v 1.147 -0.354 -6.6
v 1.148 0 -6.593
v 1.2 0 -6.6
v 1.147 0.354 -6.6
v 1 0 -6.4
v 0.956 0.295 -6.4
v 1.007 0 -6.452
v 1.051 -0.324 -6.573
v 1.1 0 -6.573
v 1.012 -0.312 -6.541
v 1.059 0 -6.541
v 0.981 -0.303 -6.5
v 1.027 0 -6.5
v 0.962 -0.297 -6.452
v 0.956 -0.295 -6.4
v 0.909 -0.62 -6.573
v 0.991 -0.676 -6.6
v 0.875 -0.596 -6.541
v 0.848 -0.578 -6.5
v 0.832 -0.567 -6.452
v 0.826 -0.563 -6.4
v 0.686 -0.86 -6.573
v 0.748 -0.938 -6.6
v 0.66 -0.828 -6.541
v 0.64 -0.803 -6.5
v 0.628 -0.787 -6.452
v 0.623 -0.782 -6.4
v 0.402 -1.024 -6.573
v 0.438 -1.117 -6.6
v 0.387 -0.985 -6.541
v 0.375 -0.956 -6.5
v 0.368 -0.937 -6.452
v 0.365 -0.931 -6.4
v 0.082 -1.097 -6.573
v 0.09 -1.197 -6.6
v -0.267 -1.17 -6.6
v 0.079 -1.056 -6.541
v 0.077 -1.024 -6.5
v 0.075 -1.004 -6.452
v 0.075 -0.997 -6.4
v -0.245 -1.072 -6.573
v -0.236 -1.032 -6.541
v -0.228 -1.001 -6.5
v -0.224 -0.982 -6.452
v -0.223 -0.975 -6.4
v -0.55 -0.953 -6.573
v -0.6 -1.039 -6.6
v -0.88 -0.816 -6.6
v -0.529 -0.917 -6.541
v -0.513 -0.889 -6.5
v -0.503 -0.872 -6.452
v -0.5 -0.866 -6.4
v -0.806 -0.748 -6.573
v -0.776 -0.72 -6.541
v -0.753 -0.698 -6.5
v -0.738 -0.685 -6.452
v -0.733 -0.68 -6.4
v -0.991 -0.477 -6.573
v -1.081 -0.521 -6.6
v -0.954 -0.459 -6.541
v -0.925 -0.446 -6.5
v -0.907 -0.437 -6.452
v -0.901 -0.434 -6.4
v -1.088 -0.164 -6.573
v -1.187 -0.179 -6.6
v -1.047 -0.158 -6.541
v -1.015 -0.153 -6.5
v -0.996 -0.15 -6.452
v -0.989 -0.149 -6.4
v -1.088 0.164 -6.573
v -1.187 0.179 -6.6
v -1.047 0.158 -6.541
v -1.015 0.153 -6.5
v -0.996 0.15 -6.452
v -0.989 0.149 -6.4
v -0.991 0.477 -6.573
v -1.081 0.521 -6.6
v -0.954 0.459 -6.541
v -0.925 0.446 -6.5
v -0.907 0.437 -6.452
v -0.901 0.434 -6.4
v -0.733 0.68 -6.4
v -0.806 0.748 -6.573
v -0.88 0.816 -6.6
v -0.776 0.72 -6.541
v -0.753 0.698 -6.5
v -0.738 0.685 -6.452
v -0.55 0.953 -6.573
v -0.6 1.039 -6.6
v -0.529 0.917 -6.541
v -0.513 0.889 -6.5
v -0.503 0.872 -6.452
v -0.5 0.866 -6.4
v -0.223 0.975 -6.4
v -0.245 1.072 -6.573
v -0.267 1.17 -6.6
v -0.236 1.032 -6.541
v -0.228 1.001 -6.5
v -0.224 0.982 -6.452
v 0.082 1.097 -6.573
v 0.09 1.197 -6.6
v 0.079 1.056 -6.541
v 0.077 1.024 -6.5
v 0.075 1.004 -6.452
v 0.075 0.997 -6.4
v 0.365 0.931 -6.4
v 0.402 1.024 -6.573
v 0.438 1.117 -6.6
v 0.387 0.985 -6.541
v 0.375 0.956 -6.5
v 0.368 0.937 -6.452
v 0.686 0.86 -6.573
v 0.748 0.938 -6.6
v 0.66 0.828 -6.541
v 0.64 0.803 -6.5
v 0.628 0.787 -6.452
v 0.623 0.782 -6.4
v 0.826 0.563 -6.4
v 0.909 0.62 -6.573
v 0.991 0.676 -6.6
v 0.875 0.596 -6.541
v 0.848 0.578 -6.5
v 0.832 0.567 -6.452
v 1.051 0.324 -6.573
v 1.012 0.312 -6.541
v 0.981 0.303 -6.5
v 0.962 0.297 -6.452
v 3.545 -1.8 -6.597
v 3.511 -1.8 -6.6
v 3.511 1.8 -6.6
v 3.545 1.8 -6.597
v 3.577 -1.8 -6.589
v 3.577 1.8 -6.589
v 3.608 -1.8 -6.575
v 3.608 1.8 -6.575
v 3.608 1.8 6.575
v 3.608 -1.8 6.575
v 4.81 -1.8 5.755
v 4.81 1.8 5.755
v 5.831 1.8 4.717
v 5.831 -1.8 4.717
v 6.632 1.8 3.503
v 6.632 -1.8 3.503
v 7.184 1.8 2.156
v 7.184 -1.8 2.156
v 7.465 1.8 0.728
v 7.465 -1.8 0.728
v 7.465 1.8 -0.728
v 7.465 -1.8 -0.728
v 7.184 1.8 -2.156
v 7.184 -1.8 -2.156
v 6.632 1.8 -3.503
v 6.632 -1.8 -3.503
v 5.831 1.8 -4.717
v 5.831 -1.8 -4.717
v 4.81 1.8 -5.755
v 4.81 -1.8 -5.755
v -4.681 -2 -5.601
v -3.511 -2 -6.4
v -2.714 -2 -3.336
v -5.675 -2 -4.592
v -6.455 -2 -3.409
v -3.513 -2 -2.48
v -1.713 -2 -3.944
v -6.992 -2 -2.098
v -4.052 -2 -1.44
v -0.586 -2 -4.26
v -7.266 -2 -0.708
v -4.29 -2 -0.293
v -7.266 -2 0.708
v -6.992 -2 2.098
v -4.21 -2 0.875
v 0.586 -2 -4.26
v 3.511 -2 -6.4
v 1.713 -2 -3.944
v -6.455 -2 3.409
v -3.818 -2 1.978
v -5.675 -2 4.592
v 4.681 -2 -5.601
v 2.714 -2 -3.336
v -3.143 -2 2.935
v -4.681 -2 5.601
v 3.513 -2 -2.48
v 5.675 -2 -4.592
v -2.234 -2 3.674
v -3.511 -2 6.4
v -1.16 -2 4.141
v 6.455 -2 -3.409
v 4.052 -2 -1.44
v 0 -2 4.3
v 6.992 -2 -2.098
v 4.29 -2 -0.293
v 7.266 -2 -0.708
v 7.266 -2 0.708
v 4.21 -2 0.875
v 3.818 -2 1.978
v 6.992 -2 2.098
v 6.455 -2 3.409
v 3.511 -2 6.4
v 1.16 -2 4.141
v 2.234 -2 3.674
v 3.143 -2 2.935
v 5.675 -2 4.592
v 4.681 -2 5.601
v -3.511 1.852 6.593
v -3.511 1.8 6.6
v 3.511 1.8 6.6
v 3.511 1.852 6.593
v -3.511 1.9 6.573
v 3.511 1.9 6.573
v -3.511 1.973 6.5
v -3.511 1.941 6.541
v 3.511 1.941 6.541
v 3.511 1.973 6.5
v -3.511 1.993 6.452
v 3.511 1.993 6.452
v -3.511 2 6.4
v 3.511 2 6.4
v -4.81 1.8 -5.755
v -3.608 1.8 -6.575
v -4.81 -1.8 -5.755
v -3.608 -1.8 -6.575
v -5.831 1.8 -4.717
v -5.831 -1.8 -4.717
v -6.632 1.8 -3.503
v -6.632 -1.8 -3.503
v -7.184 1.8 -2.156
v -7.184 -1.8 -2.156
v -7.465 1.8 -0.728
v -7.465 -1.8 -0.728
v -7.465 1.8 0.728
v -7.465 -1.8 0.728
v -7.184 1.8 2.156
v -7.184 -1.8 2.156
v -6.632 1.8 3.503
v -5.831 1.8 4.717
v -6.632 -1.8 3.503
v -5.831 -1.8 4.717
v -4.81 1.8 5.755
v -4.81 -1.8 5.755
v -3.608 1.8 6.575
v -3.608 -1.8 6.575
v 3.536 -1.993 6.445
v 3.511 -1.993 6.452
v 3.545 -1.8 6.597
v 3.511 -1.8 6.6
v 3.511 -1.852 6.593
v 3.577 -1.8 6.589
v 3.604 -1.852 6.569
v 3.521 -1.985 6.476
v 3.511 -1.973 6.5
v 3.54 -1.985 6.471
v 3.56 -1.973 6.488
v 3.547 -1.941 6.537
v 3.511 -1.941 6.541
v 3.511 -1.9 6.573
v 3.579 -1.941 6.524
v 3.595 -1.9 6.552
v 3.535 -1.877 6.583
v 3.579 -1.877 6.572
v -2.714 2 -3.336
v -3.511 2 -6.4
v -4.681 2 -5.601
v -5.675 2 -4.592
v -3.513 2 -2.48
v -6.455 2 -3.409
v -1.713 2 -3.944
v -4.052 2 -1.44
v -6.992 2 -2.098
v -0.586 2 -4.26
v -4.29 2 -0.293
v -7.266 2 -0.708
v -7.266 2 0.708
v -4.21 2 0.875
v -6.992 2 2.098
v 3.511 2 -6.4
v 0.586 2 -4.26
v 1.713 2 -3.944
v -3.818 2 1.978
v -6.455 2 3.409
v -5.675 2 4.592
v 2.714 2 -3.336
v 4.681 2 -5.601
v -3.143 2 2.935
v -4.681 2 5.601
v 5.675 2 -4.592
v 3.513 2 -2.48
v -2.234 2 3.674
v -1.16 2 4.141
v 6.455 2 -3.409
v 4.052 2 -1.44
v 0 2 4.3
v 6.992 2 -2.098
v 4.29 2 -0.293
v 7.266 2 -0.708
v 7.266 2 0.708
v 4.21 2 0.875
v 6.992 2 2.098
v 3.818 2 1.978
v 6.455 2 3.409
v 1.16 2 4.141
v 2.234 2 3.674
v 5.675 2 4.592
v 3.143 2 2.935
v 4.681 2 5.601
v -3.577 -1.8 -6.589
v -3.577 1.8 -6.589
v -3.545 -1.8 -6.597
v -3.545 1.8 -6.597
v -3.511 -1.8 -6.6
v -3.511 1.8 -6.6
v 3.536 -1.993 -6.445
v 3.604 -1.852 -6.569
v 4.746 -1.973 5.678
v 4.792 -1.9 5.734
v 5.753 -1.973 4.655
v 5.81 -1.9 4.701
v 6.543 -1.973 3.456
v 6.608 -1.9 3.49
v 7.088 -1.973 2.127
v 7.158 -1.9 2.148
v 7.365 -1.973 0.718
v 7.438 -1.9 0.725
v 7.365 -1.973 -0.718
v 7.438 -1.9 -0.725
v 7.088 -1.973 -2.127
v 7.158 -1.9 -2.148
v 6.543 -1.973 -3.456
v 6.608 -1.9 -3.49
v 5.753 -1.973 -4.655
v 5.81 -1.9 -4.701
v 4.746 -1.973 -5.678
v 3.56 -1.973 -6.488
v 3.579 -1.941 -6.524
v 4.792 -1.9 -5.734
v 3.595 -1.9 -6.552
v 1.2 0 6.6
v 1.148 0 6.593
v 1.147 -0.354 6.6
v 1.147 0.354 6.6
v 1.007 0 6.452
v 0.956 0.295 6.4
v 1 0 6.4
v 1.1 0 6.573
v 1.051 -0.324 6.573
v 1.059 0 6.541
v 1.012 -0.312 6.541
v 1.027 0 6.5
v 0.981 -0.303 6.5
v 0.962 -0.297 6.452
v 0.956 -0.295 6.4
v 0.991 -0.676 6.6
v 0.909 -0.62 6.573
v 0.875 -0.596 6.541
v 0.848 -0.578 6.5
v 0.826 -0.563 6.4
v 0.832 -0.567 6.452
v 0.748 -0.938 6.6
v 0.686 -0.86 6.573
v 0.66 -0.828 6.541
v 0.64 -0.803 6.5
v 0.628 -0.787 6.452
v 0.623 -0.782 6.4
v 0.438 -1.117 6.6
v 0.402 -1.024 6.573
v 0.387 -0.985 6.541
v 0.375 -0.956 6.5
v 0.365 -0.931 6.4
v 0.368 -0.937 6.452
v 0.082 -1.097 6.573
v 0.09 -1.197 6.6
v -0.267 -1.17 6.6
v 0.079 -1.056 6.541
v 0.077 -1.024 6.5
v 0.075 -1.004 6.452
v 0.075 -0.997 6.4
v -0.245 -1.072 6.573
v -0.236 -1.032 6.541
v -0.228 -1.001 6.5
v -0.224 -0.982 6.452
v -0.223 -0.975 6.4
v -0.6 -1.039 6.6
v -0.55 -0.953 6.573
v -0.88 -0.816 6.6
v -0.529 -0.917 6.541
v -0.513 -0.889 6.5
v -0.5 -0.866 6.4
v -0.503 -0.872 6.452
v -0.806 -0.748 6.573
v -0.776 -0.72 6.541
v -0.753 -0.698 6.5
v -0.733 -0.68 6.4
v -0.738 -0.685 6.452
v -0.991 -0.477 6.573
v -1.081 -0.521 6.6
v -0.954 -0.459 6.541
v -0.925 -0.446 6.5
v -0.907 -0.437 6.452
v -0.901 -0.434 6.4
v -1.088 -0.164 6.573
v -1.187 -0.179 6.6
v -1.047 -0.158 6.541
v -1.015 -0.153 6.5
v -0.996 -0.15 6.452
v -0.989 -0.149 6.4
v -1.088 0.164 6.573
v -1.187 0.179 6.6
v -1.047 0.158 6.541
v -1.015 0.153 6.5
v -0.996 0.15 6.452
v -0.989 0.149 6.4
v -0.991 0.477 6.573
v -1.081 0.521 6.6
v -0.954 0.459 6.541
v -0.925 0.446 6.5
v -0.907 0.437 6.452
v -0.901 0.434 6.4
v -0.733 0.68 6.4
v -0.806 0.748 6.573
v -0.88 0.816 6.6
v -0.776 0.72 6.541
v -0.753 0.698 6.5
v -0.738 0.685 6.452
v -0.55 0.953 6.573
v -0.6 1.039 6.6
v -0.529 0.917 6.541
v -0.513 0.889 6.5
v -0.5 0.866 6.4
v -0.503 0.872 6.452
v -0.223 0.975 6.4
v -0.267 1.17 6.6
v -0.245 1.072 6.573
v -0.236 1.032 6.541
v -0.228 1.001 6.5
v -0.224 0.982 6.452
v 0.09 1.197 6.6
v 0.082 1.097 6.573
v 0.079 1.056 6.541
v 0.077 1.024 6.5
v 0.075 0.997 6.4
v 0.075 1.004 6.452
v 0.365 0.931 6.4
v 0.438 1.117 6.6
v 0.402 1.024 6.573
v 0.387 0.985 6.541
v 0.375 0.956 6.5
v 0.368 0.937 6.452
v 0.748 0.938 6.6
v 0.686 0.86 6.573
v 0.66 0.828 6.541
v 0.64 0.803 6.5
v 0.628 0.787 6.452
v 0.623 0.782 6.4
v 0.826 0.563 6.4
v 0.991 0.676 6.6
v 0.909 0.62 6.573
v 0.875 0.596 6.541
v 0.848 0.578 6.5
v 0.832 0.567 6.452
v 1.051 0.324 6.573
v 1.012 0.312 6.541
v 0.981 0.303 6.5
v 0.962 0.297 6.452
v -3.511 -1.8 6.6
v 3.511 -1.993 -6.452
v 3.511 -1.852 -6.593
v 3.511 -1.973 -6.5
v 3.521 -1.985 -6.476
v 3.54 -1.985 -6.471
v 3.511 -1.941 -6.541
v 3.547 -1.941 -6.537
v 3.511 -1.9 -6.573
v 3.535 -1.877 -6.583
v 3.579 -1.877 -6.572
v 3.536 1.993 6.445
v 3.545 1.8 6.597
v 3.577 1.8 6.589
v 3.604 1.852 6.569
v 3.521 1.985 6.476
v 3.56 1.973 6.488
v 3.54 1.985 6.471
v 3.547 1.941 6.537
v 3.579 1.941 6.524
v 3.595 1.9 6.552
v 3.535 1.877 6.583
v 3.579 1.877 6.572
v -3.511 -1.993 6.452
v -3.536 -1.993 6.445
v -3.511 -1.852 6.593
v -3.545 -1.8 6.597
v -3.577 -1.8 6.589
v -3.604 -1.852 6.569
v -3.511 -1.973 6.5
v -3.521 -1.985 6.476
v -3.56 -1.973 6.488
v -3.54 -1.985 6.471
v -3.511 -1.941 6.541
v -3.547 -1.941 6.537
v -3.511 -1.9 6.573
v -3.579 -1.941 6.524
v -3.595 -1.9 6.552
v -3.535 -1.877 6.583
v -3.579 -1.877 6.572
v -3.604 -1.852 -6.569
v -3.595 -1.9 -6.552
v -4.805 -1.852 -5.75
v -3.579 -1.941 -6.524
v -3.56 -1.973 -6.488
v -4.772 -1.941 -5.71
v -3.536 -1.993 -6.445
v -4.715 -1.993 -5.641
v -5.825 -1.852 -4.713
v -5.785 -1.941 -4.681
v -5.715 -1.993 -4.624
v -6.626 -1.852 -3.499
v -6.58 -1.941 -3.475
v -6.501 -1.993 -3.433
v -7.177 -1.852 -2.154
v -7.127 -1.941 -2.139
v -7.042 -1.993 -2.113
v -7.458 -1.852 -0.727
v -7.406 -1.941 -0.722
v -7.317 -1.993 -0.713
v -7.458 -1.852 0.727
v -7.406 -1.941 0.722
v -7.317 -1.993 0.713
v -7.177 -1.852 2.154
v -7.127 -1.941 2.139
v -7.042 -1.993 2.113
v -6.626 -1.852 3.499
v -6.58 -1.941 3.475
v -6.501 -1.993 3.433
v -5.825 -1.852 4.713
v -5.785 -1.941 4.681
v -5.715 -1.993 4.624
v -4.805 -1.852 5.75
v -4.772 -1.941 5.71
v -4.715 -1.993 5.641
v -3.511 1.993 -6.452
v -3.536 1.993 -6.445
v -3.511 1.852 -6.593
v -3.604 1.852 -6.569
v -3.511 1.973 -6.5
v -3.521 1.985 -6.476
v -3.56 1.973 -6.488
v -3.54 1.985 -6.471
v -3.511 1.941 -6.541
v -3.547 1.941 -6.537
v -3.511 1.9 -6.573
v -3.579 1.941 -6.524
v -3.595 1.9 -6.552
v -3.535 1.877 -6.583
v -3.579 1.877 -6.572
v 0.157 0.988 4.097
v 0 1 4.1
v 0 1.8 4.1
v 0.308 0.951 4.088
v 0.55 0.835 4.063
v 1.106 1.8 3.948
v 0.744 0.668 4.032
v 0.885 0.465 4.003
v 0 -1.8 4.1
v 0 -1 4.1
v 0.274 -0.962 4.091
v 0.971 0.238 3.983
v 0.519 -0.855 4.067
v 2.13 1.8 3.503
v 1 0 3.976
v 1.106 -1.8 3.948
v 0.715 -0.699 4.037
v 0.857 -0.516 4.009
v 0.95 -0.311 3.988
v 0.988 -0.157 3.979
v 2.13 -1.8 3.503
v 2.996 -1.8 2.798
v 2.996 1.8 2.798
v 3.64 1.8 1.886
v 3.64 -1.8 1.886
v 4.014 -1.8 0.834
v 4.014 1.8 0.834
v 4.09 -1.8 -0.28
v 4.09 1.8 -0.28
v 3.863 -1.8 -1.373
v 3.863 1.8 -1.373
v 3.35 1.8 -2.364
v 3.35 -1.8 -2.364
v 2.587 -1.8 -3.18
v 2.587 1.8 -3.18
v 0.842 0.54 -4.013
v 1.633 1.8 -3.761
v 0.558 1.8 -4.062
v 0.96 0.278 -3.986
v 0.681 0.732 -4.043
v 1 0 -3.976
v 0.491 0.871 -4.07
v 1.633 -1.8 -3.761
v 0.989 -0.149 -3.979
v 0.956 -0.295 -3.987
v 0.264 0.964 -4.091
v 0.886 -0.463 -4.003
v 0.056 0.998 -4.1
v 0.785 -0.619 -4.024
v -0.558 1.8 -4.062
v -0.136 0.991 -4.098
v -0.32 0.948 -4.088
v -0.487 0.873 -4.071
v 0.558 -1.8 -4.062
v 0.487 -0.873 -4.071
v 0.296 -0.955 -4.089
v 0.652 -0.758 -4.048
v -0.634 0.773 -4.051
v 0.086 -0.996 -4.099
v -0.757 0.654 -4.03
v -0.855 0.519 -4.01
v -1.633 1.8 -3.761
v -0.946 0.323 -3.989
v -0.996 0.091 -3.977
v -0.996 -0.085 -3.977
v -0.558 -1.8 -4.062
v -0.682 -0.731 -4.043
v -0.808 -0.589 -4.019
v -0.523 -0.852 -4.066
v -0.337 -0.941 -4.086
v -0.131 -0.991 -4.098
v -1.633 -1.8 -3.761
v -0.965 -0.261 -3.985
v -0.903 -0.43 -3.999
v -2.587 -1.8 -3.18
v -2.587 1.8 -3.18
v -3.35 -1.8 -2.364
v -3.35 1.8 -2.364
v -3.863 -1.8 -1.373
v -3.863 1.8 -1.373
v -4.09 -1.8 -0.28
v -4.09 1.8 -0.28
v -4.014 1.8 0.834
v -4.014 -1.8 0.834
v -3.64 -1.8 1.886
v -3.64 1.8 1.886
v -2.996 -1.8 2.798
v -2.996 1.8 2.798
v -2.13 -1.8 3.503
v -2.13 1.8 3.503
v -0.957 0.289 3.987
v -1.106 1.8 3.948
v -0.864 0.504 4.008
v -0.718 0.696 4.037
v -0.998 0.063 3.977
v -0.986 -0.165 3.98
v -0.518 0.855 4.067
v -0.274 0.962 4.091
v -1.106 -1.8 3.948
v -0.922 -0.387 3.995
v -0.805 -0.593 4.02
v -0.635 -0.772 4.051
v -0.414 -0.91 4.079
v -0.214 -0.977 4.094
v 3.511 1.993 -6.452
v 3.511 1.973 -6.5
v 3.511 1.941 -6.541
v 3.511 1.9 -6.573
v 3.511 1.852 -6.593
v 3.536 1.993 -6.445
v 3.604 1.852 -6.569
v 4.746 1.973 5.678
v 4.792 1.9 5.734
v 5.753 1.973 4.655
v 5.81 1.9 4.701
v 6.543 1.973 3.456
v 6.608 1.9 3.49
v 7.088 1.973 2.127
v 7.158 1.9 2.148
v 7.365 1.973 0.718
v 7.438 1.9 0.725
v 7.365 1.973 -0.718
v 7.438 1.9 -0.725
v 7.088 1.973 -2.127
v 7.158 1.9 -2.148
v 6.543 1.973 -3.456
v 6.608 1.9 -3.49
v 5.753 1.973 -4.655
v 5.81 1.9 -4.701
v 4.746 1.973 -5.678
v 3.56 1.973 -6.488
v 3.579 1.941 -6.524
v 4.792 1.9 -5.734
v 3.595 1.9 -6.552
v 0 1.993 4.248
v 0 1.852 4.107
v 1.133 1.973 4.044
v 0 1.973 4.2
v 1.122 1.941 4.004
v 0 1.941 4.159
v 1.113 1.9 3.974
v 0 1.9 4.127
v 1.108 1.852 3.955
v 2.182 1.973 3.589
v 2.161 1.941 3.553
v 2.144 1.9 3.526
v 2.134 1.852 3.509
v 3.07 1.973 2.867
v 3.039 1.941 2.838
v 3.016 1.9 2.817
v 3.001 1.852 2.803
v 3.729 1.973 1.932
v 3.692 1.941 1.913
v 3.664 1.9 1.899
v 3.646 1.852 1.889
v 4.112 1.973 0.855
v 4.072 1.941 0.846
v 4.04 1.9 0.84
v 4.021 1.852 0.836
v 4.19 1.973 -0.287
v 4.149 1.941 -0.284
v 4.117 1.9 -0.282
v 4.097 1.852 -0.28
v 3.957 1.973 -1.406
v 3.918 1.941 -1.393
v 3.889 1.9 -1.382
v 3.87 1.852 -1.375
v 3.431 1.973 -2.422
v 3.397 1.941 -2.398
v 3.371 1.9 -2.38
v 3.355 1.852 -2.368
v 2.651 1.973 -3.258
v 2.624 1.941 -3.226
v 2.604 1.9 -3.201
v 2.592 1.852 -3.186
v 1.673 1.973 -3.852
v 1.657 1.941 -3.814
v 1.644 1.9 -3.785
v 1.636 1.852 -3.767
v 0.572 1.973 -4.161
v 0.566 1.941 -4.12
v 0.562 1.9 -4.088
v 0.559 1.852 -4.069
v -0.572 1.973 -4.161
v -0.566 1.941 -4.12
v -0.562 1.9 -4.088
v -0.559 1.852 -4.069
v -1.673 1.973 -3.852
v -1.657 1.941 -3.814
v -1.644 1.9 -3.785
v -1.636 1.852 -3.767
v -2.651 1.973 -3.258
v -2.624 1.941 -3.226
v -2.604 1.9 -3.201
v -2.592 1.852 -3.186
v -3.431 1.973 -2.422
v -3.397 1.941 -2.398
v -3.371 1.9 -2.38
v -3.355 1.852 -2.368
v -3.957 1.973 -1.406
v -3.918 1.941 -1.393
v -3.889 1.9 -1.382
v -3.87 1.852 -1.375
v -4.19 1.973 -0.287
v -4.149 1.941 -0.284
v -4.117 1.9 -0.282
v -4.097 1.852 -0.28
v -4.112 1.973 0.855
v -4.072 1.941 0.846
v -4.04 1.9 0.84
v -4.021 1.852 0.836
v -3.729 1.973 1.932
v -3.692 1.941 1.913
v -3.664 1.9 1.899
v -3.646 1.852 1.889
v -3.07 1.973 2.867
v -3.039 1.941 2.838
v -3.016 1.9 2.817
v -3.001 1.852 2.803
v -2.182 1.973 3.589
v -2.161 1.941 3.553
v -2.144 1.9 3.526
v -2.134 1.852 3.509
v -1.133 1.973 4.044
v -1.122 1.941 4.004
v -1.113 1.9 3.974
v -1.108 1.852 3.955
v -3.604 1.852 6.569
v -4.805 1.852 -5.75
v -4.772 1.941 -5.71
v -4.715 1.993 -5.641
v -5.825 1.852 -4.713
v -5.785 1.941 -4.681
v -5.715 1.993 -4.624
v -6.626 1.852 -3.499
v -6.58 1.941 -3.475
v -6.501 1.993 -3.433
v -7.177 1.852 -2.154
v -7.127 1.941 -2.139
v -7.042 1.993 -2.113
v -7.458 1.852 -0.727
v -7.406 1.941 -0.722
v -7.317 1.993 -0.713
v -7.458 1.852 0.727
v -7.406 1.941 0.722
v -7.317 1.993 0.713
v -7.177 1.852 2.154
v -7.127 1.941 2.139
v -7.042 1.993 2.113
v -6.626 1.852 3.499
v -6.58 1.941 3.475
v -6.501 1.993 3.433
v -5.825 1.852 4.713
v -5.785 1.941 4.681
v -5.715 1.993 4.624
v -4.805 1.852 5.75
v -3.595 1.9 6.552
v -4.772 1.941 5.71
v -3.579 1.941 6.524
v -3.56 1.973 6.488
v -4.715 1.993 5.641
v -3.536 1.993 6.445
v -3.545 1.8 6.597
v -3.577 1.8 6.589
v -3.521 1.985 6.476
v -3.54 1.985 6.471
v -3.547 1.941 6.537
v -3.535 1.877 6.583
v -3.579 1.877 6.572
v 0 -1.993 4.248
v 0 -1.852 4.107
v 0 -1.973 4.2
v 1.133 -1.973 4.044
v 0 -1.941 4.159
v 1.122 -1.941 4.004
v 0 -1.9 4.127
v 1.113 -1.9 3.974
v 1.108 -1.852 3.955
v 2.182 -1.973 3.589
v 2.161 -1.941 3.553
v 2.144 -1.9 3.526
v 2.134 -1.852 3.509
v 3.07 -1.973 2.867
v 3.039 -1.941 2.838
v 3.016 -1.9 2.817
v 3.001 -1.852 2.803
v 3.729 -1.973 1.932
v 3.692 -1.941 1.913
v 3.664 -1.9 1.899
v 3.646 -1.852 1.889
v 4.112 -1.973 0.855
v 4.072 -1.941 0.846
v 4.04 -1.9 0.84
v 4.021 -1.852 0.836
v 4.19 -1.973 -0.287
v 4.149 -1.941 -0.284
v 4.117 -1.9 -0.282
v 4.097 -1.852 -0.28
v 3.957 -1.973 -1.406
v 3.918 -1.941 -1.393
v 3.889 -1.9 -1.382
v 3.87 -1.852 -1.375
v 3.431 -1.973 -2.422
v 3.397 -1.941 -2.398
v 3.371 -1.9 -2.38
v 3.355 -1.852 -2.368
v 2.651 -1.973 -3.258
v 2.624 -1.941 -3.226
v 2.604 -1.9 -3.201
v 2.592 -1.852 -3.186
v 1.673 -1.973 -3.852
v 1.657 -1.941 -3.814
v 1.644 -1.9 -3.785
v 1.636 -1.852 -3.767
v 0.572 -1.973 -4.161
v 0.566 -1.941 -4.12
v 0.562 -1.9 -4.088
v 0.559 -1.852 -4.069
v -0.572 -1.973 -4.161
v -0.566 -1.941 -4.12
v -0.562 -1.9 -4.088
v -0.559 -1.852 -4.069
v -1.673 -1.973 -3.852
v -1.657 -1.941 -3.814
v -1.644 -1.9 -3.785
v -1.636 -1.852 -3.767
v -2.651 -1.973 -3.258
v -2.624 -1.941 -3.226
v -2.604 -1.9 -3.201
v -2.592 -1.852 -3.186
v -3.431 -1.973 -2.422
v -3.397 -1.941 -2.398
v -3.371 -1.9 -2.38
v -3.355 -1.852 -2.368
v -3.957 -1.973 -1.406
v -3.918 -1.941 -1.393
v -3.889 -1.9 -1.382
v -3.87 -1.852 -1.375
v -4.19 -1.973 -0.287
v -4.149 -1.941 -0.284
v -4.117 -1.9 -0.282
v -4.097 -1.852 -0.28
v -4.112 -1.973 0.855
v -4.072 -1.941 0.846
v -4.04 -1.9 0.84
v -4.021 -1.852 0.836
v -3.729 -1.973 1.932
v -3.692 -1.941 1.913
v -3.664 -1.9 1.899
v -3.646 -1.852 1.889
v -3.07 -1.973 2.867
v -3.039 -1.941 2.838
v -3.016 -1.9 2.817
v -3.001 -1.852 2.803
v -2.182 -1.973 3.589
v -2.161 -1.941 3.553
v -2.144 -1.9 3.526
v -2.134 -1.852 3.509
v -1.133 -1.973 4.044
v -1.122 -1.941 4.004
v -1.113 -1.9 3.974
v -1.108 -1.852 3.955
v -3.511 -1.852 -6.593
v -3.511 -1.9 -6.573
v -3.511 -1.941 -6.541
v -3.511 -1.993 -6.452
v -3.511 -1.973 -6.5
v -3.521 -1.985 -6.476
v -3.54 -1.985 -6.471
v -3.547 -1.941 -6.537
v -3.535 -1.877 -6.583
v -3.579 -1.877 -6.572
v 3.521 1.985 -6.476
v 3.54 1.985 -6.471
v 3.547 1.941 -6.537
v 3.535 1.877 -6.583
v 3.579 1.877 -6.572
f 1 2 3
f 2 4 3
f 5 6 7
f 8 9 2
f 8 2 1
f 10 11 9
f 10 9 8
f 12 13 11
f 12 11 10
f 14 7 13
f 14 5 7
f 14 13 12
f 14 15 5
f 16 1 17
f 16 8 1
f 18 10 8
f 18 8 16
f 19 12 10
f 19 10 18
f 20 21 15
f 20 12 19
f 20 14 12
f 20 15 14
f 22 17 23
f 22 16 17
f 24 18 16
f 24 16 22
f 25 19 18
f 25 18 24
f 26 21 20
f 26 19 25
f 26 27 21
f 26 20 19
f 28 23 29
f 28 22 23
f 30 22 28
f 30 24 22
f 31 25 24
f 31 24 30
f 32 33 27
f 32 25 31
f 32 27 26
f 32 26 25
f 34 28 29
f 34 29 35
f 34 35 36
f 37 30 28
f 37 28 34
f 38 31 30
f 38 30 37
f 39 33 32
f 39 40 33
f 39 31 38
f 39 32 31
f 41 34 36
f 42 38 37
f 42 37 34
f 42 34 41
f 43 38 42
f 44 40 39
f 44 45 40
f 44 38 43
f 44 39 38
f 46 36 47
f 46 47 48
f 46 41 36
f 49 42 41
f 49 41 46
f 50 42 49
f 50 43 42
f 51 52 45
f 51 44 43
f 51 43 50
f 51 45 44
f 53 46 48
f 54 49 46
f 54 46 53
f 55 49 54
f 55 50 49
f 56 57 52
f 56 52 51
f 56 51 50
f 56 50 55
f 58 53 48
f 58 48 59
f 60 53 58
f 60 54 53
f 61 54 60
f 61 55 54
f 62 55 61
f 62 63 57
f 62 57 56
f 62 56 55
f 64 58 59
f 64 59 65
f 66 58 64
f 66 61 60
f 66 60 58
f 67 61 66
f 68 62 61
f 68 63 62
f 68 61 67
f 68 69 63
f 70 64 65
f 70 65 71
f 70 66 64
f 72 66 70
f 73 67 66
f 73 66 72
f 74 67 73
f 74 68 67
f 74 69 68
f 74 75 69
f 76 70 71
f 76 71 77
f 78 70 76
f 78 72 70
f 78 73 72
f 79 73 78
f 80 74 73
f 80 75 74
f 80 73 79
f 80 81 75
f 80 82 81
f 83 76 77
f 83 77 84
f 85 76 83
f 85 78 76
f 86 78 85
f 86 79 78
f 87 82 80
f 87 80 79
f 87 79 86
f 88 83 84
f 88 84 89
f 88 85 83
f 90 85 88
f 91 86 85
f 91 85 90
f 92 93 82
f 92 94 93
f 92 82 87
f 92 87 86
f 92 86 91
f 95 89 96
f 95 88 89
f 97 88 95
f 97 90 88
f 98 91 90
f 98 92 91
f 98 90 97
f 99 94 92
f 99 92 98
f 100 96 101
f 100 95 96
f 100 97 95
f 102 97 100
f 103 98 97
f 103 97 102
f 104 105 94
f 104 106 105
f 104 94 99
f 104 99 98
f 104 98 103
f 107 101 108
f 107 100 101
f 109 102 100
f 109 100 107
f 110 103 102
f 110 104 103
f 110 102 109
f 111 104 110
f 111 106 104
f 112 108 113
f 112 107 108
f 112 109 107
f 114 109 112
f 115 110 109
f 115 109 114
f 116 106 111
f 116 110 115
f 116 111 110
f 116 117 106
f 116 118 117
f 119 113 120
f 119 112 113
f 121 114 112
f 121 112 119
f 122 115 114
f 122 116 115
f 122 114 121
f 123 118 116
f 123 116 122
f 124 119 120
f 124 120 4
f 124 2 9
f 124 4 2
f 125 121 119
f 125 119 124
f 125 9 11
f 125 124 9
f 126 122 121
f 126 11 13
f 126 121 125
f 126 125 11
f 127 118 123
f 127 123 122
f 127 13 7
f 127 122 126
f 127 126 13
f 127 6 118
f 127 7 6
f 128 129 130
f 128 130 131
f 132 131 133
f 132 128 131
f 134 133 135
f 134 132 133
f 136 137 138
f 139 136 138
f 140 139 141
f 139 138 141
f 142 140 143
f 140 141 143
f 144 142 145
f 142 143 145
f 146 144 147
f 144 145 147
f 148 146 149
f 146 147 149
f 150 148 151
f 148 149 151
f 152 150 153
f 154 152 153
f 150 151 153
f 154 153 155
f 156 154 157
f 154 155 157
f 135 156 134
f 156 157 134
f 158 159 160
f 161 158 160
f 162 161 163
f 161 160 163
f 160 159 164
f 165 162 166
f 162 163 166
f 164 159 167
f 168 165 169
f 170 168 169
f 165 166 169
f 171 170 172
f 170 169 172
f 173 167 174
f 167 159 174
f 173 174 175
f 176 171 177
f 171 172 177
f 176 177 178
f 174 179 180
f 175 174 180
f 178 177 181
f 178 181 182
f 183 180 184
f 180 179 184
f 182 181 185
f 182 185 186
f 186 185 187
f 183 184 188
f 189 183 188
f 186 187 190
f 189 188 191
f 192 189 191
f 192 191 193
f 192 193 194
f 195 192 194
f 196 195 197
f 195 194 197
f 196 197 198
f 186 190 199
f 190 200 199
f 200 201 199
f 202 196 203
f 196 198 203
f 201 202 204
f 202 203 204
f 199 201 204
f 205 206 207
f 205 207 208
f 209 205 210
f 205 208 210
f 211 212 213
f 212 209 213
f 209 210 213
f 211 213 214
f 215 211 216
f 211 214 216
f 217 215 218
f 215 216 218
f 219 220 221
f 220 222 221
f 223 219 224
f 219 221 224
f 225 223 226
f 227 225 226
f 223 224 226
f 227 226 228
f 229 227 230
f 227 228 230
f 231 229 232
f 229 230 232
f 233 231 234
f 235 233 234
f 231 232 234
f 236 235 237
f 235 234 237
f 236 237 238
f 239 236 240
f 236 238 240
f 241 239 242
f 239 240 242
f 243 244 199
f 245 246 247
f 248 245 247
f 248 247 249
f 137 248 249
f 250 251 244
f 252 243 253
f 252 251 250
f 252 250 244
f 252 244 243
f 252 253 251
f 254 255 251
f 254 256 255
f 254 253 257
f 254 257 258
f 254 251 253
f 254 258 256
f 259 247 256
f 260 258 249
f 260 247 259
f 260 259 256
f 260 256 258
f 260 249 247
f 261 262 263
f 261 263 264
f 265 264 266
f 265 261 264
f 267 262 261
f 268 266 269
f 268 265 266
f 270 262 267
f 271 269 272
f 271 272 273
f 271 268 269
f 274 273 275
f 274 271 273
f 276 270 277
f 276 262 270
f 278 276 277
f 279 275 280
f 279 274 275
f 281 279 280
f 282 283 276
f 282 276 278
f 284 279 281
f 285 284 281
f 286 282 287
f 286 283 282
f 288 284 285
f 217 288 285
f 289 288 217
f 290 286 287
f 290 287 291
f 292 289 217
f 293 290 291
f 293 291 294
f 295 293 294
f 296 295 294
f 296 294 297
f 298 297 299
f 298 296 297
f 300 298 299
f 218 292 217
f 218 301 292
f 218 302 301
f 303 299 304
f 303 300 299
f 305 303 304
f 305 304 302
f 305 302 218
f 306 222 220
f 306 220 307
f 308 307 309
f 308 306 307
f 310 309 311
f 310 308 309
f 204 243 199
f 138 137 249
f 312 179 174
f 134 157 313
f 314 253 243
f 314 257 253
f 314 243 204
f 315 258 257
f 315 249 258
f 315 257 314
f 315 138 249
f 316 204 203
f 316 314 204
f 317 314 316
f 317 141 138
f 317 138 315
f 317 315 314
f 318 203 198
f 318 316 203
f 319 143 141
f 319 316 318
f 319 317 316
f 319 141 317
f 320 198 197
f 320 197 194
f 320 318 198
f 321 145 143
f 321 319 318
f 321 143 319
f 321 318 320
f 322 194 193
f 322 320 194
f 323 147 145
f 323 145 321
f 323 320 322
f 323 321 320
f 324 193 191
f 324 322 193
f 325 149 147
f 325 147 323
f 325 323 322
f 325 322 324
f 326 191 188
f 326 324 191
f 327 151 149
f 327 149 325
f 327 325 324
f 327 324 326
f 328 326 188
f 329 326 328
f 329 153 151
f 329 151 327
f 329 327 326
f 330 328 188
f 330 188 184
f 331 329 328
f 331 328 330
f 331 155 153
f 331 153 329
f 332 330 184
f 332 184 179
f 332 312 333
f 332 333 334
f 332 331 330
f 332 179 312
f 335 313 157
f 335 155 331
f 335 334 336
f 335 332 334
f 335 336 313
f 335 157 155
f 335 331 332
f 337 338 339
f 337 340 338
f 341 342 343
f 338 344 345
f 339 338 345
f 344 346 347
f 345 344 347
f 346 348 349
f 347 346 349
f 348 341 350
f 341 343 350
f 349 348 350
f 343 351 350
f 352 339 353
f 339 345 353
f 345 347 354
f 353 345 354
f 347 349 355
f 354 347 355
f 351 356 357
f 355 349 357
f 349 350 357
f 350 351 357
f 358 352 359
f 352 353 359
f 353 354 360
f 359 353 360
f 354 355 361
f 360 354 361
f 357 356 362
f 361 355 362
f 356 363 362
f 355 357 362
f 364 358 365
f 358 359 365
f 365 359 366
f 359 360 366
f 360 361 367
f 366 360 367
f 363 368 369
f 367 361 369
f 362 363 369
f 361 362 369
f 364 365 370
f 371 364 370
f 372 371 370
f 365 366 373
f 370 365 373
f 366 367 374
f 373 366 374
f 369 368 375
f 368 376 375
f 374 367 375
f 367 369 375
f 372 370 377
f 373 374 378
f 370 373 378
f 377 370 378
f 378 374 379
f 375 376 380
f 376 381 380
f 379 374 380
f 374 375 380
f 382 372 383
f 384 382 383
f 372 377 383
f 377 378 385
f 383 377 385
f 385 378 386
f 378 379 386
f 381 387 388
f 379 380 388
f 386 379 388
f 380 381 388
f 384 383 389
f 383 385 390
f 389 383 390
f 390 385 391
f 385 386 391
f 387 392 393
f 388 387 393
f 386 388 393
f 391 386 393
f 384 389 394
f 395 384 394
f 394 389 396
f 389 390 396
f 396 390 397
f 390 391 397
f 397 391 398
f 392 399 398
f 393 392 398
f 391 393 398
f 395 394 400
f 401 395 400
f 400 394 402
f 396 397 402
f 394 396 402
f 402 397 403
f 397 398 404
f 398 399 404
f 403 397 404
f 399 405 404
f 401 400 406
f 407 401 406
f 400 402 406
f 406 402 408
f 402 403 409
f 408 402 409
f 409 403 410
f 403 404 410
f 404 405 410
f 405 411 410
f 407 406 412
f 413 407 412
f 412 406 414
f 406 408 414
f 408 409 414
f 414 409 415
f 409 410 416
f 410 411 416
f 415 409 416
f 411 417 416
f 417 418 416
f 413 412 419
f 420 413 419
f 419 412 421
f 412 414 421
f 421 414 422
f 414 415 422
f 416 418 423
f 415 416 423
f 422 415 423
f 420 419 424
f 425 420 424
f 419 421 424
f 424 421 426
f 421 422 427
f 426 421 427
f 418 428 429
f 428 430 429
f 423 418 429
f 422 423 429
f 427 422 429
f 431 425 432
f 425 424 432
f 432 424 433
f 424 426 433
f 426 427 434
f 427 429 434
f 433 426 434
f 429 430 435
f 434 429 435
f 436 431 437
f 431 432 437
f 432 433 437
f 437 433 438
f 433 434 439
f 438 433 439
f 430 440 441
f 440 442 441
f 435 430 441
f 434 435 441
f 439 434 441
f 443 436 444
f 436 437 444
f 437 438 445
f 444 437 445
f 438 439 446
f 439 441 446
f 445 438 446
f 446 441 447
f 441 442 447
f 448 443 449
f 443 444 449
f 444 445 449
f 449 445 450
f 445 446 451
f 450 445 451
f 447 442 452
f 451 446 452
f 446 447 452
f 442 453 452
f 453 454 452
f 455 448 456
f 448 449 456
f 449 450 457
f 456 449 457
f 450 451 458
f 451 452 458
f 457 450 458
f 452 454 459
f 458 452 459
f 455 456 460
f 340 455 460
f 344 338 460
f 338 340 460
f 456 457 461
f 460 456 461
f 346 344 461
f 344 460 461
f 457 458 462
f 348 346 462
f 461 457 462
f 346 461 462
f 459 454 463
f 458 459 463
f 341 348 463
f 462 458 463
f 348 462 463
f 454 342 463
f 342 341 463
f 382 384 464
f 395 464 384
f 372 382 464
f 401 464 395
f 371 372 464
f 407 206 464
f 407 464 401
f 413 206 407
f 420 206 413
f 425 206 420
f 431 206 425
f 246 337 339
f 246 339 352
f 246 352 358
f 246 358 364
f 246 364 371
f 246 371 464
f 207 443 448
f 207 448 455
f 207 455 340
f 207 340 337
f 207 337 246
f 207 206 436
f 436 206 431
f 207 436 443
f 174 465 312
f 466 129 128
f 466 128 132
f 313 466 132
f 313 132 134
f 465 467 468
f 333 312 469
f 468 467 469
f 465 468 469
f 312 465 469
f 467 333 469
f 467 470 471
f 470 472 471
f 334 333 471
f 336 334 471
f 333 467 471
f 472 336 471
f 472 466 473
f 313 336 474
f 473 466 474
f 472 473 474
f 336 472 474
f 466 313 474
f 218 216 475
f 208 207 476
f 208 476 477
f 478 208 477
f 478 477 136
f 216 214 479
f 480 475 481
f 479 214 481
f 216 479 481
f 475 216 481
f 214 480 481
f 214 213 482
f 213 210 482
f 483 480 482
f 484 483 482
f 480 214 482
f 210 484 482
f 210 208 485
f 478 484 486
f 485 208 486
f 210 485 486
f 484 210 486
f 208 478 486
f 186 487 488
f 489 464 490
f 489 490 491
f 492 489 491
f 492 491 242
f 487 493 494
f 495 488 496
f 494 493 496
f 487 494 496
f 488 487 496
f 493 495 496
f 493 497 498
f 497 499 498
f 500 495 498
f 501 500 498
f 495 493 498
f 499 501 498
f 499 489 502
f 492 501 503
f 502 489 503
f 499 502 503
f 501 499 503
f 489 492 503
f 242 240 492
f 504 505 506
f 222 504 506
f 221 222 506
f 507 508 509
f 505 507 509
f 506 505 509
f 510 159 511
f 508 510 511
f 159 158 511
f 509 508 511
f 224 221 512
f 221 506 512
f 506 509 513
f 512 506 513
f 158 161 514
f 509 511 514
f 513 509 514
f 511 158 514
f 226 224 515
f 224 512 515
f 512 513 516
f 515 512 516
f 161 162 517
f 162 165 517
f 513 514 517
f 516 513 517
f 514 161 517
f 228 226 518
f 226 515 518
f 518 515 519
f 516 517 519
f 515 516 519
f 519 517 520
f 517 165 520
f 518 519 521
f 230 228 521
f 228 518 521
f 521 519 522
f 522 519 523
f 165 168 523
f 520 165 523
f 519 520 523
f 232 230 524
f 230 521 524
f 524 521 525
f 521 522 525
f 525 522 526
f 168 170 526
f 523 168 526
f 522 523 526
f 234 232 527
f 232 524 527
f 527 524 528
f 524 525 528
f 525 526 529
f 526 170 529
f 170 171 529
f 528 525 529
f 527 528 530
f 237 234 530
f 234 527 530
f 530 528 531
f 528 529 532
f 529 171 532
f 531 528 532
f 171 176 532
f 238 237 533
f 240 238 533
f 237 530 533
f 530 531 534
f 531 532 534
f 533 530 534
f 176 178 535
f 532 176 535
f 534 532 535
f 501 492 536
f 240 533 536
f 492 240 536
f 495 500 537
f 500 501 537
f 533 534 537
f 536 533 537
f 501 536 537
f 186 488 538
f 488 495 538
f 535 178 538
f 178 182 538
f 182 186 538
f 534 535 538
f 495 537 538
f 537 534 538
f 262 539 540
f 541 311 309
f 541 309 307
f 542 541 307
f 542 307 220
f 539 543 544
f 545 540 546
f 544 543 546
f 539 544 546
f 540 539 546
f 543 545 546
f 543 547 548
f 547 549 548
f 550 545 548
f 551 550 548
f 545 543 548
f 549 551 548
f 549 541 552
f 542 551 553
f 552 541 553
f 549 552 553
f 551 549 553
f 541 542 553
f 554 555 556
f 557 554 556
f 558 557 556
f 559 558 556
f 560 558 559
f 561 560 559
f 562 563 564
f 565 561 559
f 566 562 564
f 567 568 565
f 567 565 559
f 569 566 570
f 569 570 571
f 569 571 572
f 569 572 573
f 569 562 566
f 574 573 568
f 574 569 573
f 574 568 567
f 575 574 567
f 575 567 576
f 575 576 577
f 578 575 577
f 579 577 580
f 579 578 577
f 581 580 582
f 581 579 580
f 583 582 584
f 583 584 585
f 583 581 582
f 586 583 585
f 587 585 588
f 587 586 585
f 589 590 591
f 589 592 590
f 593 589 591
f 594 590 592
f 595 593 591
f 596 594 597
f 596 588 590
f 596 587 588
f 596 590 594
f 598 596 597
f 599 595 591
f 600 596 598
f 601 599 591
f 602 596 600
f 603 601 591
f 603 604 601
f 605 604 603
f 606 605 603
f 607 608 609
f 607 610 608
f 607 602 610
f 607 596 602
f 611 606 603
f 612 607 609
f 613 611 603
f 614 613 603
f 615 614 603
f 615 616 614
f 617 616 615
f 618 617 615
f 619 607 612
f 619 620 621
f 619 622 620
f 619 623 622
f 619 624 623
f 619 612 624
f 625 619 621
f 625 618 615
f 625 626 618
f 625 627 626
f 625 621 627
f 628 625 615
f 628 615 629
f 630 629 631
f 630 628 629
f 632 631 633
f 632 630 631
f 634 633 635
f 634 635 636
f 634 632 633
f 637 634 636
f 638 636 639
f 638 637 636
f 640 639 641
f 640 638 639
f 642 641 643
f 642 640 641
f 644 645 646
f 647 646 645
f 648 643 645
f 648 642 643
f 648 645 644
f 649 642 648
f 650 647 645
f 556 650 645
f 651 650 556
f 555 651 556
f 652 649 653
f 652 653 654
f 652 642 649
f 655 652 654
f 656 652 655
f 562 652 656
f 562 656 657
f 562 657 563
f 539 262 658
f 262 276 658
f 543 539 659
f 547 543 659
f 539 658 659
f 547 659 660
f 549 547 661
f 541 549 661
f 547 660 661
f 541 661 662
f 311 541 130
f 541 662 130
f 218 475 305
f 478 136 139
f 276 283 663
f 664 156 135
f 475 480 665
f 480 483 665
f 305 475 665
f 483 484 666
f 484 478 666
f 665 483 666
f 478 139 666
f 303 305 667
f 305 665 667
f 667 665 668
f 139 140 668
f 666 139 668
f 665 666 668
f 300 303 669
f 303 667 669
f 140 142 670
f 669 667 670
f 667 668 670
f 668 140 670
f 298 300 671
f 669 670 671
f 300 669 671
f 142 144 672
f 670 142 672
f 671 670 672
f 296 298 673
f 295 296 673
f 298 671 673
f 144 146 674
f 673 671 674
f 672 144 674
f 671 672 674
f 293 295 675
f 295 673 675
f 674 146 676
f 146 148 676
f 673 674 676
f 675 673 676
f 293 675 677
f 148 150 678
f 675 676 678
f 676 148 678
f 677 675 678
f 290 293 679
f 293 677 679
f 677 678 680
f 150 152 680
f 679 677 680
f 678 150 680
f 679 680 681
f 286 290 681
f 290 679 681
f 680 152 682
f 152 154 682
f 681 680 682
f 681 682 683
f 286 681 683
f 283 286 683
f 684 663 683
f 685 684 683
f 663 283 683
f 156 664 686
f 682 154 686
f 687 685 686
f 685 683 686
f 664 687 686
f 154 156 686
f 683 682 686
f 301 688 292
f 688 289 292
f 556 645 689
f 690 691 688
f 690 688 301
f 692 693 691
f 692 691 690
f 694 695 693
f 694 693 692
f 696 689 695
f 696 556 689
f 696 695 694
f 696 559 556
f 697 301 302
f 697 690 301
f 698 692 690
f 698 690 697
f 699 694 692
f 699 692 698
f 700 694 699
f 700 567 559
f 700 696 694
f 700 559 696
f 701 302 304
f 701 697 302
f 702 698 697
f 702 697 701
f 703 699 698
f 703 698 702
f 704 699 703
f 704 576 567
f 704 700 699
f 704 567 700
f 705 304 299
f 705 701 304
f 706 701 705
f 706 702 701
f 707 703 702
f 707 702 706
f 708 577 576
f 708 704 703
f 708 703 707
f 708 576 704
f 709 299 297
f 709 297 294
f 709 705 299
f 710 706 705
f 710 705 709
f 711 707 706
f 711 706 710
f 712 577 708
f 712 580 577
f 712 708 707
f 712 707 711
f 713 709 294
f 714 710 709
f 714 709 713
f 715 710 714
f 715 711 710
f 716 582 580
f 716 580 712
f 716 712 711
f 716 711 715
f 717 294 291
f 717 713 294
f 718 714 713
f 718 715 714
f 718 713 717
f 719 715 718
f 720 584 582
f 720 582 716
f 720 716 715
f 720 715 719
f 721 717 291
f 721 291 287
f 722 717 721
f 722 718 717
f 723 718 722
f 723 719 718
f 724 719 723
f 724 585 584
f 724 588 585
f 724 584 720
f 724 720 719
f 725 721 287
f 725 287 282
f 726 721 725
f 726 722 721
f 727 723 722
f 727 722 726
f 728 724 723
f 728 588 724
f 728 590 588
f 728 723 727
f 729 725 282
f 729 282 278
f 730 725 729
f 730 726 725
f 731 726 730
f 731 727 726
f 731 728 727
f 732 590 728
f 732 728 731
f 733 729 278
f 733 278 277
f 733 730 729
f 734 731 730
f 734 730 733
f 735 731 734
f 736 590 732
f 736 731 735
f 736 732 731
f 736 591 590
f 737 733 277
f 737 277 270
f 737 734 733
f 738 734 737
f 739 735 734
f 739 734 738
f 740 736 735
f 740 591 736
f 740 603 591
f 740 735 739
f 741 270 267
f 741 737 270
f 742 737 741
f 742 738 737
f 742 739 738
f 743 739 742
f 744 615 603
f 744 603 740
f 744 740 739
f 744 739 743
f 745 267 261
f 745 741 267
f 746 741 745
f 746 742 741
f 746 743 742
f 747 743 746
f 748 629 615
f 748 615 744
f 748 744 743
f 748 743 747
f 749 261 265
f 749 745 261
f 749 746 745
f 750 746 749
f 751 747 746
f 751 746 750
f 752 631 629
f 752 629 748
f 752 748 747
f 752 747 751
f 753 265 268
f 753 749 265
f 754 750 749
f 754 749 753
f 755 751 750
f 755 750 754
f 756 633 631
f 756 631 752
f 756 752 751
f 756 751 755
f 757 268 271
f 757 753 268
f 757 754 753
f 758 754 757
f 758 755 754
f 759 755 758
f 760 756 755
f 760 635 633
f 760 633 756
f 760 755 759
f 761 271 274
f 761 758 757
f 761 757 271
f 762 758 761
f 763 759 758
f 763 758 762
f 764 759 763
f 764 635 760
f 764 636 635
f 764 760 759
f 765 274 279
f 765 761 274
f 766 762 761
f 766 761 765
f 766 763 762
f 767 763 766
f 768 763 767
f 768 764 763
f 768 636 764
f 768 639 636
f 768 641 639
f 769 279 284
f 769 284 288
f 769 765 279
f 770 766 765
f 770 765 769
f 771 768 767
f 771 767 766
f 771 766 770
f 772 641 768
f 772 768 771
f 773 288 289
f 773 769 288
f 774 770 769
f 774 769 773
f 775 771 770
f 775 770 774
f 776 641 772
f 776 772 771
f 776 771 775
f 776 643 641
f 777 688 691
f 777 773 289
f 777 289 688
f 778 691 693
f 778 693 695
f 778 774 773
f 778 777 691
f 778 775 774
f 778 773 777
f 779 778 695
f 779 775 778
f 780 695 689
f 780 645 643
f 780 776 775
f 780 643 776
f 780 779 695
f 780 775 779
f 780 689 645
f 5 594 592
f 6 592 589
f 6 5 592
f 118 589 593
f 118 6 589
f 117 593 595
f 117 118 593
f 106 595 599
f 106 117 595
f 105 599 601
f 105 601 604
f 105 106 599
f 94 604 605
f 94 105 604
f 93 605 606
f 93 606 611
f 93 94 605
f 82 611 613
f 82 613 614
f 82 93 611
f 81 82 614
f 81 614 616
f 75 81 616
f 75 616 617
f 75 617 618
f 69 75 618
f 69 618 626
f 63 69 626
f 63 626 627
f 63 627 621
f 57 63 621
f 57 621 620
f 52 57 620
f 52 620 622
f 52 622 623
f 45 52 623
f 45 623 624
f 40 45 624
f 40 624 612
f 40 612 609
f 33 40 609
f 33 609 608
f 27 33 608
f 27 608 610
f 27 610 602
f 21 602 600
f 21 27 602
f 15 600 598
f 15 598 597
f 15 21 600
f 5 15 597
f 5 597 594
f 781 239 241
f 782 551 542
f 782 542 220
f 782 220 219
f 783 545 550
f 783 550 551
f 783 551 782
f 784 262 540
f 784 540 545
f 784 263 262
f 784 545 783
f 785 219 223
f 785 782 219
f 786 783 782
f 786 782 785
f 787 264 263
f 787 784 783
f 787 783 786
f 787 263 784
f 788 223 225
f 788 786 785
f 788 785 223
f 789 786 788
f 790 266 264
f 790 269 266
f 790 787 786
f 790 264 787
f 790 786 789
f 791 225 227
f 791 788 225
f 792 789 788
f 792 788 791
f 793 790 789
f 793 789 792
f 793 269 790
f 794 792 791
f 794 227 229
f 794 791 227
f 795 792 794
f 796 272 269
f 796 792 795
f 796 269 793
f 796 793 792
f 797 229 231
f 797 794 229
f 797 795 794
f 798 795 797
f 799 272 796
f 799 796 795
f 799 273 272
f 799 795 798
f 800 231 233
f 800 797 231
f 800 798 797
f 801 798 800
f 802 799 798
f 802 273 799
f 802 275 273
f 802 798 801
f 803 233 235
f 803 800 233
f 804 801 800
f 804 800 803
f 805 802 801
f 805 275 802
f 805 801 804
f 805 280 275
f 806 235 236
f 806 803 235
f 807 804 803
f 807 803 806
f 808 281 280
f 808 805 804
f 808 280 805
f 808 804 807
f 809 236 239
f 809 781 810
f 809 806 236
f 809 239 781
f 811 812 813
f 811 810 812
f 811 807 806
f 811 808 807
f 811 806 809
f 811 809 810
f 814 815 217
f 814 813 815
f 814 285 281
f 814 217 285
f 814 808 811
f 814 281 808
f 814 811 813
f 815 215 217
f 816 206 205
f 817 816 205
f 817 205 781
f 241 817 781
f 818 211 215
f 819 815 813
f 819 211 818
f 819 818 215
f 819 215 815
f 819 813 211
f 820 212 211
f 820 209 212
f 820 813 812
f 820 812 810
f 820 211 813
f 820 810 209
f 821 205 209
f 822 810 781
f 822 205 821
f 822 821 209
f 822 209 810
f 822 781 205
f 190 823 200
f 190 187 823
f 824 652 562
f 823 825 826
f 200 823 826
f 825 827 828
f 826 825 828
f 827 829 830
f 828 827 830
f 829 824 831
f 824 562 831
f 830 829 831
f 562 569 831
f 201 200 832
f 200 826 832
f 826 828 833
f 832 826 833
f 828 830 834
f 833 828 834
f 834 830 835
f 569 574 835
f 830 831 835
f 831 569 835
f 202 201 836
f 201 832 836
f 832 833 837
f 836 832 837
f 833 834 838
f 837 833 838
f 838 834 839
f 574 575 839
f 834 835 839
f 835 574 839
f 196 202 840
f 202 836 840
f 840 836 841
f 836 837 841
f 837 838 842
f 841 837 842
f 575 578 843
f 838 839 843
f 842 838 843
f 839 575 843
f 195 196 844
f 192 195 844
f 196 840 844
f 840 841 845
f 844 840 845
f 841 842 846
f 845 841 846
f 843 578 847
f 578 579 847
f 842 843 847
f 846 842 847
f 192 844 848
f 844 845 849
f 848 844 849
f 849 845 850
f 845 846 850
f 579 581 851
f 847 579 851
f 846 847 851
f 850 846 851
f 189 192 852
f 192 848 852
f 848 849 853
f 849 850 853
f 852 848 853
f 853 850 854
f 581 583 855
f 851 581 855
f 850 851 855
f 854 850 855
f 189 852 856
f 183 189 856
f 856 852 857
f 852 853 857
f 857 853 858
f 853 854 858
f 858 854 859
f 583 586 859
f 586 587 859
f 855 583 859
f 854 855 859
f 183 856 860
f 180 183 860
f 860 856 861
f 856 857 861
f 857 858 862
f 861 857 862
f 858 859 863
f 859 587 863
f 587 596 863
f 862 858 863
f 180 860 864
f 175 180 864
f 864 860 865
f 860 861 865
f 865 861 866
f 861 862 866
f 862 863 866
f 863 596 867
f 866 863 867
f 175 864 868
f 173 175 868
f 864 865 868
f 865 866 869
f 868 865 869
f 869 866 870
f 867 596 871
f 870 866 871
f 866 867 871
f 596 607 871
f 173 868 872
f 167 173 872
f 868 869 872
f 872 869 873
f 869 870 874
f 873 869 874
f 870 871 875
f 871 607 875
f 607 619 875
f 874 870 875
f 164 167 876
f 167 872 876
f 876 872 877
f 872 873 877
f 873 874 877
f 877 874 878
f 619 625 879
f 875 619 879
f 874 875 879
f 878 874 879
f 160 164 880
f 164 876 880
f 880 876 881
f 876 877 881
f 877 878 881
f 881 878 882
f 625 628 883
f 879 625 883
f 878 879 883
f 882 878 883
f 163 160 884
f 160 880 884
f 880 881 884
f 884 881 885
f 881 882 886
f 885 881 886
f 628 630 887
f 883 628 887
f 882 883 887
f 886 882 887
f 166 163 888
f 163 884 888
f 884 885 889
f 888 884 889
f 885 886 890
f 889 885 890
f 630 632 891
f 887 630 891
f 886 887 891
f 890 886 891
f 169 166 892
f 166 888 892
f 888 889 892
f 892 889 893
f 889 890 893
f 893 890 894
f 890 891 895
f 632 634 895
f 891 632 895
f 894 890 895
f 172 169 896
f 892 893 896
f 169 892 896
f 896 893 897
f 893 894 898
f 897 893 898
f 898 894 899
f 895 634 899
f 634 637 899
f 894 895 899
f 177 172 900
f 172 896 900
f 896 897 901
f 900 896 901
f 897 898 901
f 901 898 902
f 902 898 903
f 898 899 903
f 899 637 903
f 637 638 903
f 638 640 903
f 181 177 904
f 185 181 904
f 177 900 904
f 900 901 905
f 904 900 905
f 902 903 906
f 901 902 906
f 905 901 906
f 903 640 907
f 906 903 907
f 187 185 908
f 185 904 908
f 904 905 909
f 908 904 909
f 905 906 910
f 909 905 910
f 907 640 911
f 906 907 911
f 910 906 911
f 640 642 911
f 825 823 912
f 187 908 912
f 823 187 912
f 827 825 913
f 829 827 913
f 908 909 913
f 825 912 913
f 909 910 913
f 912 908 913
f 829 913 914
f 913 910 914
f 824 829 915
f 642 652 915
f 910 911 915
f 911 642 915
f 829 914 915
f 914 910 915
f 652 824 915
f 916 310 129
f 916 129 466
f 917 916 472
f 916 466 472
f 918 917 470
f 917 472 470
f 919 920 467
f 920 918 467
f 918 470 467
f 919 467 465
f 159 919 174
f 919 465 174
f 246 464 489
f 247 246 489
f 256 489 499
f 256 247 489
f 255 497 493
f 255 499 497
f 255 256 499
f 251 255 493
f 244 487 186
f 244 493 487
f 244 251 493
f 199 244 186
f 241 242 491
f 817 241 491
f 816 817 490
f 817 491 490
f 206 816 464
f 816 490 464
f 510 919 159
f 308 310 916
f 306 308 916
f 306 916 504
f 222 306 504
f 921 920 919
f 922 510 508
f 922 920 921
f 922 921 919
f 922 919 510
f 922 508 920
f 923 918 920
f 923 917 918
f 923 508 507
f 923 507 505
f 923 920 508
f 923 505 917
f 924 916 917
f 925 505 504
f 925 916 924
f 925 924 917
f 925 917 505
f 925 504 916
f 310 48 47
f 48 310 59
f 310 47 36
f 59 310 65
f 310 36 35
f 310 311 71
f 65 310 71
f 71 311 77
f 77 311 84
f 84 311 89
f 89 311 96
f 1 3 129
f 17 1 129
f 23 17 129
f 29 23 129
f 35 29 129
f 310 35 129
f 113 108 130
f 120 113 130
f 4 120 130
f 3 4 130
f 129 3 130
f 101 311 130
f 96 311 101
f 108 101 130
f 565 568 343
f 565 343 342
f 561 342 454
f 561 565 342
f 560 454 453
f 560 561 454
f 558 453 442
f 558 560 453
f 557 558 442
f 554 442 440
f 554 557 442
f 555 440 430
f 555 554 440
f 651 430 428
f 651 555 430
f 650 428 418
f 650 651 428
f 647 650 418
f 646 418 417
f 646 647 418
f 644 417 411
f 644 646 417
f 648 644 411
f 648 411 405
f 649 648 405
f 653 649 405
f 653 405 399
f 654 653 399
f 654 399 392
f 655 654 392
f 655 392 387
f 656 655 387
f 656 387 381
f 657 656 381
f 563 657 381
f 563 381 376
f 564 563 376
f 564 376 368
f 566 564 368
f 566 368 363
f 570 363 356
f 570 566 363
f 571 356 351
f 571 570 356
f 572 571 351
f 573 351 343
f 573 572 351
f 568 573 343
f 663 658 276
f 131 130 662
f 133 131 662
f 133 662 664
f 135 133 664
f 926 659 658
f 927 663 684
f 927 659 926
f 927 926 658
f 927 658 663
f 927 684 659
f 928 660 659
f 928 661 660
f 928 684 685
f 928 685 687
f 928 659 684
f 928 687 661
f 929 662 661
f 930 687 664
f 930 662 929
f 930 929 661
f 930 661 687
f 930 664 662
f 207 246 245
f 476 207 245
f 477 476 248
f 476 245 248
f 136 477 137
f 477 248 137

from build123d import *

# Parameters (mm, degrees)
EXTRUDE_1_DEPTH          = 2
EXTRUDE_1_DEPTH_BACK     = 2
SKETCH_1_R               = 7.5
SKETCH_1_R_2             = 4.1
CUT_EXTRUDE_1_DEPTH      = 11.793516572
CUT_EXTRUDE_1_DEPTH_BACK = 11.793516572
SKETCH_2_R               = 1
SKETCH_3_W               = 25.706722618
SKETCH_3_H               = 2.806509832
CUT_EXTRUDE_2_DEPTH      = 12.335784227
FILLET_1_R               = 0.2


with BuildPart() as part:
    # 草图1 → 凸台-拉伸1 (new, two sides: drawn at the far end of the back side and taken through both)
    with BuildSketch(Plane(origin=(0, 0, 0), x_dir=(1, 0, 0), z_dir=(0, 1, 0)).offset(-EXTRUDE_1_DEPTH_BACK)):
        Circle(SKETCH_1_R)
        Circle(SKETCH_1_R_2, mode=Mode.SUBTRACT)
    extrude(amount=EXTRUDE_1_DEPTH + EXTRUDE_1_DEPTH_BACK)

    # 草图2 → 切除-拉伸1 (cut, two sides: drawn at the far end of the back side and taken through both)
    with BuildSketch(Plane.XY.offset(-CUT_EXTRUDE_1_DEPTH_BACK)):
        Circle(SKETCH_2_R)
    extrude(amount=CUT_EXTRUDE_1_DEPTH + CUT_EXTRUDE_1_DEPTH_BACK, mode=Mode.SUBTRACT)

    # 草图3 → 切除-拉伸2 (cut, through all)
    with BuildSketch(Plane(origin=(0, 2, 0), x_dir=(1, 0, 0), z_dir=(0, 1, 0))):
        with Locations((0, 8.003254916)):
            Rectangle(SKETCH_3_W, SKETCH_3_H)
        with Locations((0, -8.003254916)):
            Rectangle(SKETCH_3_W, SKETCH_3_H)
    extrude(amount=-CUT_EXTRUDE_2_DEPTH, mode=Mode.SUBTRACT)

    # 圆角1
    fillet_1_edges = [part.edges().sort_by_distance(p)[0] for p in [
        (-4.1, 2, 0),
        (-4.1, -2, 0),
        (7.5, 2, 0),
        (0, 2, 6.6),
        (-7.5, 2, 0),
        (0, 2, -6.6),
        (0, -2, 6.6),
        (7.5, -2, 0),
        (0, -2, -6.6),
        (-7.5, -2, 0),
        (-1, 0, 6.6),
        (3.562302626, 0, 6.6),
        (-3.562302626, 0, 6.6),
        (-1, 0, -6.6),
        (-3.562302626, 0, -6.6),
        (3.562302626, 0, -6.6),
    ]]
    fillet(fillet_1_edges, radius=FILLET_1_R)


solid = part.part
